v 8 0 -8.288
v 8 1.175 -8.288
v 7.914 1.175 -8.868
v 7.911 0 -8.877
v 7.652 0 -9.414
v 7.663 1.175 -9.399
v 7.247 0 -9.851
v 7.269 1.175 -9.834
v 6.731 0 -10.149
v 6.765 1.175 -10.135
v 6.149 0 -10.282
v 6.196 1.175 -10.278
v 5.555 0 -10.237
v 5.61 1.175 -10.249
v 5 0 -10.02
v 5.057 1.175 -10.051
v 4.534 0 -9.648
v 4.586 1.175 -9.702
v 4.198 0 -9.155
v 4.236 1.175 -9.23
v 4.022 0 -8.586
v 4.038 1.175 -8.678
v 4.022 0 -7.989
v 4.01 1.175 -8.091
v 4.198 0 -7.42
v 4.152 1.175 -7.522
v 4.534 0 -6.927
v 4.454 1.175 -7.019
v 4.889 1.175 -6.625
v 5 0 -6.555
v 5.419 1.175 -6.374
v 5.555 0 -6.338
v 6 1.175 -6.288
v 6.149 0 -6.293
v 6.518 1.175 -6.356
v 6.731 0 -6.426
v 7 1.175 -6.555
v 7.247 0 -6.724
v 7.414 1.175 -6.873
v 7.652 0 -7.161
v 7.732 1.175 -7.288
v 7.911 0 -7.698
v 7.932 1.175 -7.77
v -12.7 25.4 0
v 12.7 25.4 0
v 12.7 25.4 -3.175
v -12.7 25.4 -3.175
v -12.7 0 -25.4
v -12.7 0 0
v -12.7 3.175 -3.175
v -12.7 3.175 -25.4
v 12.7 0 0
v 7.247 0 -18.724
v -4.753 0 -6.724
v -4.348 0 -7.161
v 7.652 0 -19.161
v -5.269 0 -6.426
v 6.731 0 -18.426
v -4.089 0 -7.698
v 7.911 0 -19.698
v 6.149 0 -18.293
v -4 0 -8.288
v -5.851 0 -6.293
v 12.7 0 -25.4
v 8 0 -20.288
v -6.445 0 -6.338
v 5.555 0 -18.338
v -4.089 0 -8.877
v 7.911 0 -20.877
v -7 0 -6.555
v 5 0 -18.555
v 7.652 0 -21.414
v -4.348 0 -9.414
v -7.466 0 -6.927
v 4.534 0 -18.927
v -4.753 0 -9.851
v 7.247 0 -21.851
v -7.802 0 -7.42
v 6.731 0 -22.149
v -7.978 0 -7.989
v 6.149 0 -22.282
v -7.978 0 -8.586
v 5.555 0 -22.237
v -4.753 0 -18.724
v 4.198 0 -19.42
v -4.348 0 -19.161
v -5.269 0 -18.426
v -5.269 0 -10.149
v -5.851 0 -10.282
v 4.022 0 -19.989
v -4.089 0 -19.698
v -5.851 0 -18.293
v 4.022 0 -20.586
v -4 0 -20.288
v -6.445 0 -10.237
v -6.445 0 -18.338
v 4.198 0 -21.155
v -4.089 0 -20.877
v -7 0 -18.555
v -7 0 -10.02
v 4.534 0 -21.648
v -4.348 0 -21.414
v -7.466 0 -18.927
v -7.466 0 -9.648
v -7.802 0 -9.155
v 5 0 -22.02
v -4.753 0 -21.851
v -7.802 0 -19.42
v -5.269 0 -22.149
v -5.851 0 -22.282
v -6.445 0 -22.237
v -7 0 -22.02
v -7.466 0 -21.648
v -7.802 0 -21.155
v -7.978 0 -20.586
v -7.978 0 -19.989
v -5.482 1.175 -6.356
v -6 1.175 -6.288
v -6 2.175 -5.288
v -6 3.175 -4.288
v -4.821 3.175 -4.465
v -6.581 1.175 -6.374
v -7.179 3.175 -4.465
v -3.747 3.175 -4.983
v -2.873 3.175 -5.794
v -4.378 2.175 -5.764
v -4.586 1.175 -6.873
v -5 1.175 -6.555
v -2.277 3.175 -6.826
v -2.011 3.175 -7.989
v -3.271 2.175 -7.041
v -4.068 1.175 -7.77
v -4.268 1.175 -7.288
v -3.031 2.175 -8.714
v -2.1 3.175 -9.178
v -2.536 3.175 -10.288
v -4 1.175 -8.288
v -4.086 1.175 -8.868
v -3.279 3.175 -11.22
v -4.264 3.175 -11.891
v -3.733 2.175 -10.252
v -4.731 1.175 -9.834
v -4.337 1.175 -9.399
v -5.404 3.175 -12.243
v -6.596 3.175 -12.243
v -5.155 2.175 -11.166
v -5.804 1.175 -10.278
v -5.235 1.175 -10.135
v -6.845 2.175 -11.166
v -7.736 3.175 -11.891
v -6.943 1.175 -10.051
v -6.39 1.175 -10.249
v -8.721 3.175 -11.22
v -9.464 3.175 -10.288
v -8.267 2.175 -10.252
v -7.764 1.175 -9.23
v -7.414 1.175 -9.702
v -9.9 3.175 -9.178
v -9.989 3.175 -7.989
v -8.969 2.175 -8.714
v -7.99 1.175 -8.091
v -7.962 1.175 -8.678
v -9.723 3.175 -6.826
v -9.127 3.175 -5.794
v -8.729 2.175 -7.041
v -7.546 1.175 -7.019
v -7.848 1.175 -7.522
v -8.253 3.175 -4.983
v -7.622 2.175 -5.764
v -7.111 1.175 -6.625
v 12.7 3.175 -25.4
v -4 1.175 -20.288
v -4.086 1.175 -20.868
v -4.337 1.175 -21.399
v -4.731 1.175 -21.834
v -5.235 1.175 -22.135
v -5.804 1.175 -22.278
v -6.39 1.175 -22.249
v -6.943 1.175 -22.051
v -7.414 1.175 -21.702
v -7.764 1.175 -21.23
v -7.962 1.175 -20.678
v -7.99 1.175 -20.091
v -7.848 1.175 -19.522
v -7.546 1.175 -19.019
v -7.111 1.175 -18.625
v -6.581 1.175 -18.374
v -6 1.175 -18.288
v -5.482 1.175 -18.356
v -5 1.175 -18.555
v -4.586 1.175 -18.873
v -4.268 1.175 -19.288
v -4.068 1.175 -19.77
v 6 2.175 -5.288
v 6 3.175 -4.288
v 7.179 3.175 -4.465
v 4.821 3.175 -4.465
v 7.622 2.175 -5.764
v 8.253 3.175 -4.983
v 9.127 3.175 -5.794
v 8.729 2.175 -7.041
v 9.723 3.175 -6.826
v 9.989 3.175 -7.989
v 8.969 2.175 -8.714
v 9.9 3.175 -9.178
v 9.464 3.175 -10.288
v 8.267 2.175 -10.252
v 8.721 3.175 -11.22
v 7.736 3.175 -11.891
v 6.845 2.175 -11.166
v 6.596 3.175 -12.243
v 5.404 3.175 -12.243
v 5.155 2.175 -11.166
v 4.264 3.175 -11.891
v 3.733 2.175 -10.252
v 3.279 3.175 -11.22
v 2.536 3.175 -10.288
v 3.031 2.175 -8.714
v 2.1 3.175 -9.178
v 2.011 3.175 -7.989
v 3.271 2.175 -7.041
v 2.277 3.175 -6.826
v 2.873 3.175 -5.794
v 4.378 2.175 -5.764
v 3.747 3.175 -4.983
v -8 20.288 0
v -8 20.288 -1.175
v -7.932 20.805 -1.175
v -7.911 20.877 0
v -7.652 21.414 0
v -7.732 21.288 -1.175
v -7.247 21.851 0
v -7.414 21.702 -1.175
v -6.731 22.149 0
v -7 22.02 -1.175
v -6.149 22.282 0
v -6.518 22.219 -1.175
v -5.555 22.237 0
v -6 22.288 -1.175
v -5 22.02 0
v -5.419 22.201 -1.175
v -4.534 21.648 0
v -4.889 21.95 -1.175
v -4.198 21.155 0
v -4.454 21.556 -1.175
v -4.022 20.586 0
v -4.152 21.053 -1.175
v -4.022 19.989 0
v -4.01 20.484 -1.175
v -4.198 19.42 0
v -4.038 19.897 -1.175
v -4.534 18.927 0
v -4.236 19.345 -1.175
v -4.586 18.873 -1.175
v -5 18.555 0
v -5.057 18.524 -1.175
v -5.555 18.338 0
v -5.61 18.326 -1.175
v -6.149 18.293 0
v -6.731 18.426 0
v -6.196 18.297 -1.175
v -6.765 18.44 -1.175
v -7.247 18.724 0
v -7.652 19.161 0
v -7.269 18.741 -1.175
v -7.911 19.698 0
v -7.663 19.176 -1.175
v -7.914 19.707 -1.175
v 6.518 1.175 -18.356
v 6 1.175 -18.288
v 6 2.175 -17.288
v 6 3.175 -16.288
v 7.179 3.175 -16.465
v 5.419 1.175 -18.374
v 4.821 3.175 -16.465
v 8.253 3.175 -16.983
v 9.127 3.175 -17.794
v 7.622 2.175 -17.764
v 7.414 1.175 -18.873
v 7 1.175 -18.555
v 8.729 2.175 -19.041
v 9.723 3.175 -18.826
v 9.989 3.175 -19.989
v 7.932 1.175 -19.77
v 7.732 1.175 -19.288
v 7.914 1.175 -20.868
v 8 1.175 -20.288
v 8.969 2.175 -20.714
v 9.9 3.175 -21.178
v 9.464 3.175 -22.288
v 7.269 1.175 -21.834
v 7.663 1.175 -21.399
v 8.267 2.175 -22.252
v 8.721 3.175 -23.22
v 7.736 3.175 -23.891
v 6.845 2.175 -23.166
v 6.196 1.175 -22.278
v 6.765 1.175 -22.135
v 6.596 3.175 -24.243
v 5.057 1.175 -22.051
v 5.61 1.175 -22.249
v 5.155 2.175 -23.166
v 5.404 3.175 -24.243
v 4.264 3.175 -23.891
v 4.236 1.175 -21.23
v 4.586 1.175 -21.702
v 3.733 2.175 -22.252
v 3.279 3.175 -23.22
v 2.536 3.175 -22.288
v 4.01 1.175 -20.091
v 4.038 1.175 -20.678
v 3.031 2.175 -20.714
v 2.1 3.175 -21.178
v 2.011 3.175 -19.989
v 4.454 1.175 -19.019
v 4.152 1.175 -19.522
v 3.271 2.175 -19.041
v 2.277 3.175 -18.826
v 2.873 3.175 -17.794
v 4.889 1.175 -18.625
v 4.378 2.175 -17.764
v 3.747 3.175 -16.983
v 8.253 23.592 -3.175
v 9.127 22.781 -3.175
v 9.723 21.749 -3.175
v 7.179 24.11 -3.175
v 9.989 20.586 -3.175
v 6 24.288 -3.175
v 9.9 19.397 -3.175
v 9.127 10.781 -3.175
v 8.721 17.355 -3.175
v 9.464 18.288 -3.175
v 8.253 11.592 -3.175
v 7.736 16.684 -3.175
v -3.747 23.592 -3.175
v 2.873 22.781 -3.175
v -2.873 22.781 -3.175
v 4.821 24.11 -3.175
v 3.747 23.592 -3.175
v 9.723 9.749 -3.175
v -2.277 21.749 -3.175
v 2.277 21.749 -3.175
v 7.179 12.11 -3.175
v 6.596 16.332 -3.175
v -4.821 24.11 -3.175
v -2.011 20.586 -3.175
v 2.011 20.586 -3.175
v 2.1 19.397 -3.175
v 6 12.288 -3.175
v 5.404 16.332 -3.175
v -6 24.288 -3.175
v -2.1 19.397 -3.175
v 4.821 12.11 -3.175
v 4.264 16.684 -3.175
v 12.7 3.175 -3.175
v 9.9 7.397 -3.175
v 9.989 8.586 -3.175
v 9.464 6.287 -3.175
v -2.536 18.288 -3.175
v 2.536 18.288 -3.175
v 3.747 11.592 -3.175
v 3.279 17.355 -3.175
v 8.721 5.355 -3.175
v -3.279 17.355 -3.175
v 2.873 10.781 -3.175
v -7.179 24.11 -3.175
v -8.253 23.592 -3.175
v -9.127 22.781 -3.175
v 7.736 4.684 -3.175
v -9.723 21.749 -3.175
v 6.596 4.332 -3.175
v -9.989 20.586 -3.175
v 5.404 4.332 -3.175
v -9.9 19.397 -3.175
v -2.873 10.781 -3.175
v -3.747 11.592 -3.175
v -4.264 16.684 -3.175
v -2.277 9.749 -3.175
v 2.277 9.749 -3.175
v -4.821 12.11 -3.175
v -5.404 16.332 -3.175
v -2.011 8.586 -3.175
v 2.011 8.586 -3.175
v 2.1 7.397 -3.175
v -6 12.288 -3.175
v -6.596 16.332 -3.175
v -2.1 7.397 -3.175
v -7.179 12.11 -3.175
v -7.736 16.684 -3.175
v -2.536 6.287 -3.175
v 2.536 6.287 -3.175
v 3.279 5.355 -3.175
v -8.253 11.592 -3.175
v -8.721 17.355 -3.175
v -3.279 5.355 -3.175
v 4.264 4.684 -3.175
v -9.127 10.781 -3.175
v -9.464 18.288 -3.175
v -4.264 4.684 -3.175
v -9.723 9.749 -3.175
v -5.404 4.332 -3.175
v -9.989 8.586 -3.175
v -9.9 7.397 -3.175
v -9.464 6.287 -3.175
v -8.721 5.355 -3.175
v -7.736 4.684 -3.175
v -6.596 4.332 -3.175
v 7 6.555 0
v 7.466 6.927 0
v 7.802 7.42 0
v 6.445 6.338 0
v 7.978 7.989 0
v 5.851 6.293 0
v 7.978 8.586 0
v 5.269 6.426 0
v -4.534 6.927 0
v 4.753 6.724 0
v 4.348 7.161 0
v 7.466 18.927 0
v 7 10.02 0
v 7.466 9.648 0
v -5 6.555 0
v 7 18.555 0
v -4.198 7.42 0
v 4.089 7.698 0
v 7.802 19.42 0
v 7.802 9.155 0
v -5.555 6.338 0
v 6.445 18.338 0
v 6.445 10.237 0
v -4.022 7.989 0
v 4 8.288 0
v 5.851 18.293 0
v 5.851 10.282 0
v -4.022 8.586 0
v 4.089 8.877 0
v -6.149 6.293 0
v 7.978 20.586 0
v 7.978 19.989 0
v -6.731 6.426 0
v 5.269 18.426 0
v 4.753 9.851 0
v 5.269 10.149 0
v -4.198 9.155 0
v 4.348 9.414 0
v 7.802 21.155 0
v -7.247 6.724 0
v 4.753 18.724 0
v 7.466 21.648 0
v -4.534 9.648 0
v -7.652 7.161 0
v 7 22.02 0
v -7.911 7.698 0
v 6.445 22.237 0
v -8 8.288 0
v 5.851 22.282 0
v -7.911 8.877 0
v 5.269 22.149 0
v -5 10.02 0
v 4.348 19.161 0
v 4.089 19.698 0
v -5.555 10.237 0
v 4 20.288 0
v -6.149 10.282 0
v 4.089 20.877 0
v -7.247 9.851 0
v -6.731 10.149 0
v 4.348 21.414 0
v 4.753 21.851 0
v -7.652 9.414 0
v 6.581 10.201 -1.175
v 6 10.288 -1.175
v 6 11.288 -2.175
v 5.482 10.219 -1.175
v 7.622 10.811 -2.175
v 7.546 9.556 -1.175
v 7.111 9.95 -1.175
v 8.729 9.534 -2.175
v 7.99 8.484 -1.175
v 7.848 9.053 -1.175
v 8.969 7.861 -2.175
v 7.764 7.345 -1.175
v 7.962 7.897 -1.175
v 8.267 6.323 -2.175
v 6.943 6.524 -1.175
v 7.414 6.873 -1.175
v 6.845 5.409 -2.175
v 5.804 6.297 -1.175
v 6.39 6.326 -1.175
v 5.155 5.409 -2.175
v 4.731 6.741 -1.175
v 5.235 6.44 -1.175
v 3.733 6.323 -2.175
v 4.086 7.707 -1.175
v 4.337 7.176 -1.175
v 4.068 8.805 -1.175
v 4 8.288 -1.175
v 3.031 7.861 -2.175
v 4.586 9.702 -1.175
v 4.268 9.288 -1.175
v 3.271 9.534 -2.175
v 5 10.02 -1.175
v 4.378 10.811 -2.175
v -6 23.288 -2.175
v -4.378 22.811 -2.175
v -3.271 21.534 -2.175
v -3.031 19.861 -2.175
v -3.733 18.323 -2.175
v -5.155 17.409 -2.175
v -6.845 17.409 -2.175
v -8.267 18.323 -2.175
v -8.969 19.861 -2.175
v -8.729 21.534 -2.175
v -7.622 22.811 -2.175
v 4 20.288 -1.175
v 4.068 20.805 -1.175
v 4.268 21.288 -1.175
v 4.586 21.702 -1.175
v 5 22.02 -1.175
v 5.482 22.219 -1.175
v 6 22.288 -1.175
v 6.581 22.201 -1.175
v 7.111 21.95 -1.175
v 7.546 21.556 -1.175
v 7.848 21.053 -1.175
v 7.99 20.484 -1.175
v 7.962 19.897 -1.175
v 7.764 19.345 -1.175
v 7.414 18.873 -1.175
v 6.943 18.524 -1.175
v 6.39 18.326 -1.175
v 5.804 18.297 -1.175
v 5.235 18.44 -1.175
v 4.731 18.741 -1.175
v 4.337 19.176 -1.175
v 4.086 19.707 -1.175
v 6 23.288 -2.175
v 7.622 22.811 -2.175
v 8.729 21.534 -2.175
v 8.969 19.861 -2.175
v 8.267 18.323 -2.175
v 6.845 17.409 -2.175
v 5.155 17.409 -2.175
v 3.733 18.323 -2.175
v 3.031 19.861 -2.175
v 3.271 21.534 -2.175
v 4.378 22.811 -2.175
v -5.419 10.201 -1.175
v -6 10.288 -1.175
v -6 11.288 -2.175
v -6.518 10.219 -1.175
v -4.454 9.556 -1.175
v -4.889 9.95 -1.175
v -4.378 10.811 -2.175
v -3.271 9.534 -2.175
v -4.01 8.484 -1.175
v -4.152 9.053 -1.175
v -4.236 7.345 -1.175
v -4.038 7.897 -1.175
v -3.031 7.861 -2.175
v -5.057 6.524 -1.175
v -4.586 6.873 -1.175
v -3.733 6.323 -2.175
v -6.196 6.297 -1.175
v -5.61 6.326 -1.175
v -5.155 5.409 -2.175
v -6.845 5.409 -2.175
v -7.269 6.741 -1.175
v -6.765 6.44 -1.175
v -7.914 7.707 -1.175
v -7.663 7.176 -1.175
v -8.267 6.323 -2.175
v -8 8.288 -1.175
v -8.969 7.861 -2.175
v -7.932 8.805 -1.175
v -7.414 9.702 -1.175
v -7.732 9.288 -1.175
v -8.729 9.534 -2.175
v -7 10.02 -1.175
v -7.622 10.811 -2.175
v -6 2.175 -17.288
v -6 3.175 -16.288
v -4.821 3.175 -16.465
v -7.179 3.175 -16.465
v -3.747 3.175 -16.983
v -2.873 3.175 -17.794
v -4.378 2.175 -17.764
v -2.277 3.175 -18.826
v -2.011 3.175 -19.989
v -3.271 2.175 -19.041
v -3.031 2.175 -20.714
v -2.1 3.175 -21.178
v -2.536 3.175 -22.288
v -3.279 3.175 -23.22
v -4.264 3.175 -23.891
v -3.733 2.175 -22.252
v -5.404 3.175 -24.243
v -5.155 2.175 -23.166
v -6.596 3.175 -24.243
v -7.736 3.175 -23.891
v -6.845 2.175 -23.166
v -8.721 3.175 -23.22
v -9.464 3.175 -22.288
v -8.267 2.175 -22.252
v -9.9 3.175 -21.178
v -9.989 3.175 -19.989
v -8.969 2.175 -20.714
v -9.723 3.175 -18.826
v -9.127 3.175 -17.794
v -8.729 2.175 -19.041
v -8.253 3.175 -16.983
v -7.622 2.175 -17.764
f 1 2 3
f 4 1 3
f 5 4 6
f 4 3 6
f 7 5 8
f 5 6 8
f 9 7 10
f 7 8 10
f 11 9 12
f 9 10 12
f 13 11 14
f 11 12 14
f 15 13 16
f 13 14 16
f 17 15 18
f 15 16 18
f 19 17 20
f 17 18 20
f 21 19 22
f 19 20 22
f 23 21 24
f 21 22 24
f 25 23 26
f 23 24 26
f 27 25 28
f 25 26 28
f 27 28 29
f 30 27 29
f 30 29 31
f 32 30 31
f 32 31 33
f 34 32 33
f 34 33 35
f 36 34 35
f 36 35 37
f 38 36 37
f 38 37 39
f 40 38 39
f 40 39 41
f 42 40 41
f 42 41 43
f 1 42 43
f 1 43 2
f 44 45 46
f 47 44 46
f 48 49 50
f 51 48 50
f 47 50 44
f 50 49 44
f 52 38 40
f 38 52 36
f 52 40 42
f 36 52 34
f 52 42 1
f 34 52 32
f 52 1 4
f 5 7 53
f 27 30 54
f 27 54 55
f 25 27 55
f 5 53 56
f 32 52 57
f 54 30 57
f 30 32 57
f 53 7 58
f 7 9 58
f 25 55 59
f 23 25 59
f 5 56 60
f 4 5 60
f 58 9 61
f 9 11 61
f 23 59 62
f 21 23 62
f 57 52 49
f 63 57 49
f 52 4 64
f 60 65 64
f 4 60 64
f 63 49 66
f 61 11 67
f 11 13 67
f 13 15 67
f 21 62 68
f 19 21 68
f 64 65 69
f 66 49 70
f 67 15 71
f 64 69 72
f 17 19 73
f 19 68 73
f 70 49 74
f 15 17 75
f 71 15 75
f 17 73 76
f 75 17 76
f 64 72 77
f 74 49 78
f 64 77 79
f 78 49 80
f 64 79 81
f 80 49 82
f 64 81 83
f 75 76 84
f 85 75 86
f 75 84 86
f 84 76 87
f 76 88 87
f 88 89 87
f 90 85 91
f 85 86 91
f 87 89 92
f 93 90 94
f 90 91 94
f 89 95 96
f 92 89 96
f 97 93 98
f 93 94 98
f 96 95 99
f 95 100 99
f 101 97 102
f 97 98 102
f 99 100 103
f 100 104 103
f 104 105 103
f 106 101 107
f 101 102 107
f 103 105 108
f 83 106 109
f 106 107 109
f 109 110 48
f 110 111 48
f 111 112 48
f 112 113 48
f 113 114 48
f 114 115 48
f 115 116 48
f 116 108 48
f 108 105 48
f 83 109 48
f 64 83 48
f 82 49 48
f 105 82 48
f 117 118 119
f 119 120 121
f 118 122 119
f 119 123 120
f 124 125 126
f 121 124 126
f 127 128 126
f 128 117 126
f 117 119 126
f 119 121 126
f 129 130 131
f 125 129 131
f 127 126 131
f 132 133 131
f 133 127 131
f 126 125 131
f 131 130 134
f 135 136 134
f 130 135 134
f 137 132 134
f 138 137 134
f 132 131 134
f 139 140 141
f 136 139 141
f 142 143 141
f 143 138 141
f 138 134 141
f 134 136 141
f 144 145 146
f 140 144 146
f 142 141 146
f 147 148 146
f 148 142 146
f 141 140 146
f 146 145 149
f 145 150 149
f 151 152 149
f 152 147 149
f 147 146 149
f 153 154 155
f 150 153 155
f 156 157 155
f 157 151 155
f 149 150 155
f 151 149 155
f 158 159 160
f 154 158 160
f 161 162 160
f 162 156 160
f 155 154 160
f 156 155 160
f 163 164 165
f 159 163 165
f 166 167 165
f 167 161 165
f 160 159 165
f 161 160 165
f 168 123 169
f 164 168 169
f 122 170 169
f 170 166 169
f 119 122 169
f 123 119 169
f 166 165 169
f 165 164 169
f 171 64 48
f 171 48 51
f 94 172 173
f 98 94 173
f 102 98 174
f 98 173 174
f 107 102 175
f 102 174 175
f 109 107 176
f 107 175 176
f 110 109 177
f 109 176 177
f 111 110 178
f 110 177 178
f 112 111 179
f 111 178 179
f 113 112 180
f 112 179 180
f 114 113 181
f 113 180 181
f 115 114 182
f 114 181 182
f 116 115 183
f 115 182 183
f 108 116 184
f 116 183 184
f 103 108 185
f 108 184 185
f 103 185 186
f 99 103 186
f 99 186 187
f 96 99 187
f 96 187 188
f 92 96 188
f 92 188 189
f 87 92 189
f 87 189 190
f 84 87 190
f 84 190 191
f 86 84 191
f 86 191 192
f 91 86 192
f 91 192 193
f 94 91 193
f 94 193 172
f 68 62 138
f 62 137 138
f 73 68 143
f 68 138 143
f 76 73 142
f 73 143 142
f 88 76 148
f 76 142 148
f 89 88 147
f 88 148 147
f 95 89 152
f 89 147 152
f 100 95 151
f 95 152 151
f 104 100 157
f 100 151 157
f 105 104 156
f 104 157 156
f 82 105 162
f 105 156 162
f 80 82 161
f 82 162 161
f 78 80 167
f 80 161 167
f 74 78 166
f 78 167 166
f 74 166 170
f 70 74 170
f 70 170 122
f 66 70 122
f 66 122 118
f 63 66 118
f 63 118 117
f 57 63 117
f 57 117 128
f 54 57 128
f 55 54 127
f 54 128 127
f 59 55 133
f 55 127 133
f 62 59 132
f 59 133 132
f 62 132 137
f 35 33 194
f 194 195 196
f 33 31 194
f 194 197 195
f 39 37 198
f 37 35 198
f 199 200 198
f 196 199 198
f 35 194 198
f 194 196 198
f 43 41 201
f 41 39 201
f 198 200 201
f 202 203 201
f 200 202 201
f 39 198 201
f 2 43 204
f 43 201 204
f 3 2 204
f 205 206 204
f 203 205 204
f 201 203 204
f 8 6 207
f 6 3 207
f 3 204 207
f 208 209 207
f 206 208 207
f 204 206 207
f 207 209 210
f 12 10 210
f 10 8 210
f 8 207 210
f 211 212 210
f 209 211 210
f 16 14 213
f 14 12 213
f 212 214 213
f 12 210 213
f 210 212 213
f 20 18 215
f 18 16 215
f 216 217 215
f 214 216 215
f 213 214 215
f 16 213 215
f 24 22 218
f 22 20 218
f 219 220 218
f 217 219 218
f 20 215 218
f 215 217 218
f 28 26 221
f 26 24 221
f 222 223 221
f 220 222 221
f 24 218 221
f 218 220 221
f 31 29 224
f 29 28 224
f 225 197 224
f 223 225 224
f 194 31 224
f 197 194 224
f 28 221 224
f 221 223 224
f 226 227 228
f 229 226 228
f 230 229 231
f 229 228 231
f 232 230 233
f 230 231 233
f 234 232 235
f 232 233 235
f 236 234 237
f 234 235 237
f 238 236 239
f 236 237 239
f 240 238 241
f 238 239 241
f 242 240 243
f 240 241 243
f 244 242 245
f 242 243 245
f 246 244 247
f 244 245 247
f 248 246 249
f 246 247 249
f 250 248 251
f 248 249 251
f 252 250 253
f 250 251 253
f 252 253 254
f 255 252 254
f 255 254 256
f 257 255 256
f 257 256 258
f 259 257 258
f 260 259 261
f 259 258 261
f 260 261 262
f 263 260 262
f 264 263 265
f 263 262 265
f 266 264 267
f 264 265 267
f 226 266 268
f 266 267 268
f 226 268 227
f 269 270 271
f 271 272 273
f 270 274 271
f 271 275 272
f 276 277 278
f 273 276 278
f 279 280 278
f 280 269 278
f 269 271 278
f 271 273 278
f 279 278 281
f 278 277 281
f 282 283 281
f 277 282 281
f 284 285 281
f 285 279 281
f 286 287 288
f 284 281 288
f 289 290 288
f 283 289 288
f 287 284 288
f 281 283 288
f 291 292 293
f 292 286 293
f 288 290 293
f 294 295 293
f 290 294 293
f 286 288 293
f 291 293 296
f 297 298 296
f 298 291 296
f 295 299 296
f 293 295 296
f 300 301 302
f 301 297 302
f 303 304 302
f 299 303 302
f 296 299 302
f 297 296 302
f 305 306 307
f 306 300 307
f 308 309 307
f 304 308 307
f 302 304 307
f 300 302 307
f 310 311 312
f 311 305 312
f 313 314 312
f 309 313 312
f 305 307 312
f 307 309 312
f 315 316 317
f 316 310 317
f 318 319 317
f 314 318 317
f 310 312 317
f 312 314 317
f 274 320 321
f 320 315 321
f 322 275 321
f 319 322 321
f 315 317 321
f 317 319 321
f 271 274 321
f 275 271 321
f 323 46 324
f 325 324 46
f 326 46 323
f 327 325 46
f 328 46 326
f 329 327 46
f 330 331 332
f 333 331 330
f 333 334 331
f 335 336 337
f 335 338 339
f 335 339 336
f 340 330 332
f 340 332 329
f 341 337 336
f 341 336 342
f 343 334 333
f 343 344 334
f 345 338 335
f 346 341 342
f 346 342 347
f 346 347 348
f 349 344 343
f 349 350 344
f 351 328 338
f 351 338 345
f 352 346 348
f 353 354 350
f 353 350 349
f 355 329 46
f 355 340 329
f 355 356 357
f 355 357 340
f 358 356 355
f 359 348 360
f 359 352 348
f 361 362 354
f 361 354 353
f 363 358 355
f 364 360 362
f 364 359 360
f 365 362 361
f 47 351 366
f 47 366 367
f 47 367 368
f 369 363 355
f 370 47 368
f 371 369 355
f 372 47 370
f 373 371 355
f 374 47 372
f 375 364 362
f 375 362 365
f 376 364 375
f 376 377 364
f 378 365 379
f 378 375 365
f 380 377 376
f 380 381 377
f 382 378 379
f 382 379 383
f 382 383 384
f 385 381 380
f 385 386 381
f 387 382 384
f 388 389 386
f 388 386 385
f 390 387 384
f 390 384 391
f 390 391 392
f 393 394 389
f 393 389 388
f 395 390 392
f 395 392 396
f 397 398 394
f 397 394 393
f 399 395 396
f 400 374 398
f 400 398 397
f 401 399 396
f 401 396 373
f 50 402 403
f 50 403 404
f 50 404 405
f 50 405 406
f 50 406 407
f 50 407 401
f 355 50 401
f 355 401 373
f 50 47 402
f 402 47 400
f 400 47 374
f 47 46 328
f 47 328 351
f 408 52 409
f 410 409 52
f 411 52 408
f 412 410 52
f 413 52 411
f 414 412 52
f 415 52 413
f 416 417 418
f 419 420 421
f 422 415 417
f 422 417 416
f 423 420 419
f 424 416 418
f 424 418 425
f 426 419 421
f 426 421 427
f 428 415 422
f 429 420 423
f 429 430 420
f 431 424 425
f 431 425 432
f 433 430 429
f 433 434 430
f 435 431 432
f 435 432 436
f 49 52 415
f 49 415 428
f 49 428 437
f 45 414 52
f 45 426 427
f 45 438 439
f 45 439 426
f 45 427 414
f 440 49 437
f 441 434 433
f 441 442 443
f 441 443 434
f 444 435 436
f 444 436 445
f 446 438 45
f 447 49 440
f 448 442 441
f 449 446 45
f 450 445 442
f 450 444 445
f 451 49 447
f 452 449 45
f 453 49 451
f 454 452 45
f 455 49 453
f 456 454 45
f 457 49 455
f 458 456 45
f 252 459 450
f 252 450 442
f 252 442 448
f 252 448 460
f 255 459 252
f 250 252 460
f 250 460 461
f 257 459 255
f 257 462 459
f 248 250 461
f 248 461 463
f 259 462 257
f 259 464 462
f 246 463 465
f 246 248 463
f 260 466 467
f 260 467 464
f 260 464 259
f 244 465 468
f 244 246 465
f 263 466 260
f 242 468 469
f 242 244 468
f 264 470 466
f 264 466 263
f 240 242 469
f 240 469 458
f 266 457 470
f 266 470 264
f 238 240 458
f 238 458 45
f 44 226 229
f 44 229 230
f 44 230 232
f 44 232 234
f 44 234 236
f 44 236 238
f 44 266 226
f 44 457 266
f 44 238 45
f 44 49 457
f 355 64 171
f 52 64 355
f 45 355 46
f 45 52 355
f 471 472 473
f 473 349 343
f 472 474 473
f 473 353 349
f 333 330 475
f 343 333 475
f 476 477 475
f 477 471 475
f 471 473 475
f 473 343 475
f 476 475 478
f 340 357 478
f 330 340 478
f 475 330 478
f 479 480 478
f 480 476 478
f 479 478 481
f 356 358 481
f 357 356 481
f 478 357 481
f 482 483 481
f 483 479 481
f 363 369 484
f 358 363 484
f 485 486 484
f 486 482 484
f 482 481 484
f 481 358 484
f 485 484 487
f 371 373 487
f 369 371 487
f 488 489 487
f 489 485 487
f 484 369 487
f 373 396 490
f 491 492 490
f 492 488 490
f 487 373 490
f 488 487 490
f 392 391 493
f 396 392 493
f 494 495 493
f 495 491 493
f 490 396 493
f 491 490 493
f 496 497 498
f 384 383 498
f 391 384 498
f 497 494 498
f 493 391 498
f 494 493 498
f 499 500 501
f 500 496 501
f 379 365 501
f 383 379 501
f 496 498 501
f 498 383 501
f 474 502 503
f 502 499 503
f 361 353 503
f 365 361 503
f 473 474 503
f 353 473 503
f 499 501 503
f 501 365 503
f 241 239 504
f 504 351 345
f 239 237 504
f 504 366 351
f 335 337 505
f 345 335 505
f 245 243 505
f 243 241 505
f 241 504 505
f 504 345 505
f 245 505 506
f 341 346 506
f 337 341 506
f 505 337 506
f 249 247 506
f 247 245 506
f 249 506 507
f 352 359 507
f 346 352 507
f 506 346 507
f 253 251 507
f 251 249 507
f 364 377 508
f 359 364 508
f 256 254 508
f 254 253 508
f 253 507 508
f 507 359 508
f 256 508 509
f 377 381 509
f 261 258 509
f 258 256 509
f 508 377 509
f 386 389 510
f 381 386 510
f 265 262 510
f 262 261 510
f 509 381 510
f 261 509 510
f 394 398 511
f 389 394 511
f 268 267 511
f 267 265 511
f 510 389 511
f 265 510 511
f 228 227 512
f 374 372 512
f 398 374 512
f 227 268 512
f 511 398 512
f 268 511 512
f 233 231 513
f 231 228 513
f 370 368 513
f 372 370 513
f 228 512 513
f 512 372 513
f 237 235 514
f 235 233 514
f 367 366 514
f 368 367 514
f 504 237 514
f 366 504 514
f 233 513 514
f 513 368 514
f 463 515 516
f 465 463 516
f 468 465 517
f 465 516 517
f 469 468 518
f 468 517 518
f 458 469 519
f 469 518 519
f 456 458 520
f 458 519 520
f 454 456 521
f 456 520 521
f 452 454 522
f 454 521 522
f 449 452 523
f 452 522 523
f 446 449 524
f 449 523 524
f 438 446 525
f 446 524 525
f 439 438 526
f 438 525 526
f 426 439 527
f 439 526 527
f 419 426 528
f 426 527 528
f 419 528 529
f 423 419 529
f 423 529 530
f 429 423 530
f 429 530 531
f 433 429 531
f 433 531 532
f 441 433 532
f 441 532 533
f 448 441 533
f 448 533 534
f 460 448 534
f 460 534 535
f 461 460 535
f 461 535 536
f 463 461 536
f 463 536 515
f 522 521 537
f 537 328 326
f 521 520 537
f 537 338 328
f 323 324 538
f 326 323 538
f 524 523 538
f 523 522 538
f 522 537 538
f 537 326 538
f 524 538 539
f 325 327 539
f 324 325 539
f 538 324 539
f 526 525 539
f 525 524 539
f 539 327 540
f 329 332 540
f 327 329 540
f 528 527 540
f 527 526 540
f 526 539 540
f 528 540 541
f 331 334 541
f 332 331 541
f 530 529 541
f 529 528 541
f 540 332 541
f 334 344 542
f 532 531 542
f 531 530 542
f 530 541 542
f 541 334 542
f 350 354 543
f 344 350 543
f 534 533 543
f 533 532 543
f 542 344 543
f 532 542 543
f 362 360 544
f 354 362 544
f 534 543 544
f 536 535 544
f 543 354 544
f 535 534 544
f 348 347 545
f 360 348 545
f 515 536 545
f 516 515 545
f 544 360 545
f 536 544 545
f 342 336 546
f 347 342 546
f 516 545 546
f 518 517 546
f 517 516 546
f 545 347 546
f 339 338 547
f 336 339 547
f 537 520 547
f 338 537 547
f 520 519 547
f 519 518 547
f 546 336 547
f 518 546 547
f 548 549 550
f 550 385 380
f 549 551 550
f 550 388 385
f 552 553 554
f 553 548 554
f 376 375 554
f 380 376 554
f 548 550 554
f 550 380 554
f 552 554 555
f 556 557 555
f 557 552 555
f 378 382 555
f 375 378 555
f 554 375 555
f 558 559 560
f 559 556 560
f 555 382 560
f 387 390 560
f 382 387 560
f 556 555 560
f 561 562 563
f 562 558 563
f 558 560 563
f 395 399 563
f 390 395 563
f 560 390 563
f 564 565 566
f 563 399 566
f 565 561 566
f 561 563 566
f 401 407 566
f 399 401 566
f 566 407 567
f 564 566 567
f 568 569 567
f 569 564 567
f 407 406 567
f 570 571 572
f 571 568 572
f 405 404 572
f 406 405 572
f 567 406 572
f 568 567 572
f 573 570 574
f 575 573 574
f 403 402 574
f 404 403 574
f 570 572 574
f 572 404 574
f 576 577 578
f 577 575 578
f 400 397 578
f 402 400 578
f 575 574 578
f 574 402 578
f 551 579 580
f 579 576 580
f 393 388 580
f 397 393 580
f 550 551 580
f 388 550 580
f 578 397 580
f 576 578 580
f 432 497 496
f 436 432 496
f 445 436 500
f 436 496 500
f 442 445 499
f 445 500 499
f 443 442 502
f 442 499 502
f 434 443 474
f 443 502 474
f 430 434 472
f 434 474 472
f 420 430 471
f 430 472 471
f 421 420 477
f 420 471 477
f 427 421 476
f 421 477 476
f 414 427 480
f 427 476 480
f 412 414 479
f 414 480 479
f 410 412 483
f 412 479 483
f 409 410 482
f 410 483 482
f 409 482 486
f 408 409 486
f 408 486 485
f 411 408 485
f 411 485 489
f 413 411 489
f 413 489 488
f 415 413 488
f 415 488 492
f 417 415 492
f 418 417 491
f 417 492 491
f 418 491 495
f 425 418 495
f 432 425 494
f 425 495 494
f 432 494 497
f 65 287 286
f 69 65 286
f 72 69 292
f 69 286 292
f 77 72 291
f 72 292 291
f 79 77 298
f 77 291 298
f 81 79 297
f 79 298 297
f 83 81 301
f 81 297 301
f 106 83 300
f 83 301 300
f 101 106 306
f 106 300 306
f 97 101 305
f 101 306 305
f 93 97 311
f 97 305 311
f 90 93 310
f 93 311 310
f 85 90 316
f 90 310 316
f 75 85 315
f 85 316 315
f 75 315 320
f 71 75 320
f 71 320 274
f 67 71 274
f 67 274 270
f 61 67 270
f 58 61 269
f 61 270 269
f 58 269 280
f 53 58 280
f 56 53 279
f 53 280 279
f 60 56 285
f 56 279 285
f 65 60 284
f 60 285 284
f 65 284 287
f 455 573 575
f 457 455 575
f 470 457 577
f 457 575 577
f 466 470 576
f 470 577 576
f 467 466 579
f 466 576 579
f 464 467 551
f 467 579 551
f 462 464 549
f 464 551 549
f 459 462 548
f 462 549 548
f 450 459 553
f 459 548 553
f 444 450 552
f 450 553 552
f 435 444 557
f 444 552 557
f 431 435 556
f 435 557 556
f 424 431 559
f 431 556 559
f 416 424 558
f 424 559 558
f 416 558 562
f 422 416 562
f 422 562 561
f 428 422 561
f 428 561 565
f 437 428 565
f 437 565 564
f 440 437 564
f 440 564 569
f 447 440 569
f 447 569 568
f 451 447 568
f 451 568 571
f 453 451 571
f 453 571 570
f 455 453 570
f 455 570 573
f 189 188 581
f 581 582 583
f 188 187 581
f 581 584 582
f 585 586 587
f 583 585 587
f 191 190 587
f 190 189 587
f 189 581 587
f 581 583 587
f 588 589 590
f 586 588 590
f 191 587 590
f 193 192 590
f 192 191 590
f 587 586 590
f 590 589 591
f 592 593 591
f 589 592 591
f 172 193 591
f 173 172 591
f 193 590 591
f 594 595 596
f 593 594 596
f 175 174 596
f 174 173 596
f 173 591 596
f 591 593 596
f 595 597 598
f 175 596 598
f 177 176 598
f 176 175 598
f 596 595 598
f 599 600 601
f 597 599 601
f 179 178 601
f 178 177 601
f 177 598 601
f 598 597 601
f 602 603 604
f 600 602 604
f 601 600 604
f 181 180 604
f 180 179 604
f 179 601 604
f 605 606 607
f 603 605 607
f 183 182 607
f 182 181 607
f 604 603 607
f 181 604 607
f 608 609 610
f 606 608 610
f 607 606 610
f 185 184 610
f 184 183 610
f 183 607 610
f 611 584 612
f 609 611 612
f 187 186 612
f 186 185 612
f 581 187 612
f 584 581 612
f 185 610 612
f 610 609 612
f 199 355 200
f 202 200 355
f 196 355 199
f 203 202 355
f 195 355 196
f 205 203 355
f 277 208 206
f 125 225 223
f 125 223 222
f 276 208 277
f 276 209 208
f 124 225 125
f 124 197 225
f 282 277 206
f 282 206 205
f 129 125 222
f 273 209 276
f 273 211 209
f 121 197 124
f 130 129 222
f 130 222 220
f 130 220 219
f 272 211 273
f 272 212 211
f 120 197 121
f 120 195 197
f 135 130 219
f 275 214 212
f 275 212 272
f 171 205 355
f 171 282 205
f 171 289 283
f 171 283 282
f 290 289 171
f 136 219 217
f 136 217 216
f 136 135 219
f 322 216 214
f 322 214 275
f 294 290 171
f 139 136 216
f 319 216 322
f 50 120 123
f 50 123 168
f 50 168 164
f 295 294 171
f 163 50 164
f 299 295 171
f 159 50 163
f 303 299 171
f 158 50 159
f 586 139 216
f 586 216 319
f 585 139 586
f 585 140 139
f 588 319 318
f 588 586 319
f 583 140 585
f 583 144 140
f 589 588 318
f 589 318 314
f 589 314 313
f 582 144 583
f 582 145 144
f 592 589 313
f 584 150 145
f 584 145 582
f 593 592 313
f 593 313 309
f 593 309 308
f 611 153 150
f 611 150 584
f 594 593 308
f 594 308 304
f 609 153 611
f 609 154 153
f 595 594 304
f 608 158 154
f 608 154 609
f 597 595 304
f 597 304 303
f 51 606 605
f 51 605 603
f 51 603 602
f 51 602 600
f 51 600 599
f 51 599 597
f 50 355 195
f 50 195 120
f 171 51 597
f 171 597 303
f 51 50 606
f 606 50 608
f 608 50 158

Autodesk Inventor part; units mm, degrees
ref_plane "YZ Plane" through (0, 0, 0) normal (1, 0, 0) x (0, 1, 0)
ref_plane "XZ Plane" through (0, 0, 0) normal (0, 1, 0) x (-1, 0, 0)
ref_plane "XY Plane" through (0, 0, 0) normal (0, 0, 1) x (1, 0, 0)
sketch "Sketch1" plane through (0, 0, 0) normal (1, 0, 0) x (0, 1, 0)
  line L0 (0, 0) -> (25.4, 0)
  line L1 (0, 0) -> (0, -25.4)
  line L2 (0, -25.4) -> (3.175, -25.4)
  line L3 (25.4, 0) -> (25.4, -3.175)
  line L4 (25.4, -3.175) -> (3.175, -3.175)
  line L5 (3.175, -3.175) -> (3.175, -25.4)
  dimension "d0" = 25.4
  dimension "d1" = 25.4
  dimension "d2" = 3.175
  dimension "d3" = 3.175
extrude "Extrusion1" add sketch "Sketch1" along normal mid plane 25.4
sketch "Sketch2" plane through (-12.7, 3.175, -3.175) normal (0, 1, 0) x (1, 0, 0)
  line L0 (0, 0) -> (25.4, 0) construction
  line L1 (25.4, 22.225) -> (25.4, 0) construction
  line L2 (25.4, 22.225) -> (0, 22.225) construction
  line L3 (0, 0) -> (0, 22.225) construction
  line L4 (12.7, 22.225) -> (12.7, 0) construction
  line L5 (0, 11.1125) -> (25.4, 11.1125) construction
  circle A0 centre (18.7, 17.1125) radius 2
  circle A1 centre (6.7, 17.1125) radius 2
  circle A2 centre (6.7, 5.1125) radius 2
  circle A3 centre (18.7, 5.1125) radius 2
  point P0 (12.7, -3.175)
  point P1 (12.7, 11.1125)
  point P2 (12.7, 11.1125)
  dimension "d7" = 4
  dimension "d8" = 6
  dimension "d32" = 6
  dimension "d35" = 360
extrude "Extrusion2" cut sketch "Sketch2" against normal through all contours A0
sketch "Sketch3" plane through (12.7, 25.4, -3.175) normal (0, 0, -1) x (-1, 0, 0)
  line L0 (25.4, 0) -> (0, 0) construction
  line L1 (0, -22.225) -> (0, 0) construction
  line L2 (25.4, -22.225) -> (0, -22.225) construction
  line L3 (25.4, 0) -> (25.4, -22.225) construction
  line L4 (12.7, 0) -> (12.7, -22.225) construction
  line L5 (0, -11.1125) -> (25.4, -11.1125) construction
  circle A0 centre (18.7, -5.1125) radius 2
  circle A1 centre (6.7, -5.1125) radius 2
  circle A2 centre (6.7, -17.1125) radius 2
  circle A3 centre (18.7, -17.1125) radius 2
  point P0 (12.7, -25.4)
  point P1 (12.7, -11.1125)
  point P2 (12.7, -11.1125)
  dimension "d13" = 4
  dimension "d14" = 6
  dimension "d39" = 6
  dimension "d42" = 360
extrude "Extrusion3" cut sketch "Sketch3" against normal through all contours A0
extrude "Extrusion4" cut sketch "Sketch2" against normal through all contours A1 | A2 | A3
extrude "Extrusion5" cut sketch "Sketch3" against normal through all contours A1 | A2 | A3
hole "Hole3" at (6, 3.175, -8.2875) at (-6, 3.175, -8.2875) at (-6, 3.175, -20.2875) at (6, 3.175, -20.2875) direction (0, -1, 0) diameter 4 end through all countersink diameter 8 countersink angle 90
hole "Hole4" at (6, 8.2875, -3.175) at (-6, 8.2875, -3.175) at (-6, 20.2875, -3.175) at (6, 20.2875, -3.175) direction (0, 0, 1) diameter 4 end through all countersink diameter 8 countersink angle 90
properties part number "Arashtrix 1in x 1in L-Bracket"
